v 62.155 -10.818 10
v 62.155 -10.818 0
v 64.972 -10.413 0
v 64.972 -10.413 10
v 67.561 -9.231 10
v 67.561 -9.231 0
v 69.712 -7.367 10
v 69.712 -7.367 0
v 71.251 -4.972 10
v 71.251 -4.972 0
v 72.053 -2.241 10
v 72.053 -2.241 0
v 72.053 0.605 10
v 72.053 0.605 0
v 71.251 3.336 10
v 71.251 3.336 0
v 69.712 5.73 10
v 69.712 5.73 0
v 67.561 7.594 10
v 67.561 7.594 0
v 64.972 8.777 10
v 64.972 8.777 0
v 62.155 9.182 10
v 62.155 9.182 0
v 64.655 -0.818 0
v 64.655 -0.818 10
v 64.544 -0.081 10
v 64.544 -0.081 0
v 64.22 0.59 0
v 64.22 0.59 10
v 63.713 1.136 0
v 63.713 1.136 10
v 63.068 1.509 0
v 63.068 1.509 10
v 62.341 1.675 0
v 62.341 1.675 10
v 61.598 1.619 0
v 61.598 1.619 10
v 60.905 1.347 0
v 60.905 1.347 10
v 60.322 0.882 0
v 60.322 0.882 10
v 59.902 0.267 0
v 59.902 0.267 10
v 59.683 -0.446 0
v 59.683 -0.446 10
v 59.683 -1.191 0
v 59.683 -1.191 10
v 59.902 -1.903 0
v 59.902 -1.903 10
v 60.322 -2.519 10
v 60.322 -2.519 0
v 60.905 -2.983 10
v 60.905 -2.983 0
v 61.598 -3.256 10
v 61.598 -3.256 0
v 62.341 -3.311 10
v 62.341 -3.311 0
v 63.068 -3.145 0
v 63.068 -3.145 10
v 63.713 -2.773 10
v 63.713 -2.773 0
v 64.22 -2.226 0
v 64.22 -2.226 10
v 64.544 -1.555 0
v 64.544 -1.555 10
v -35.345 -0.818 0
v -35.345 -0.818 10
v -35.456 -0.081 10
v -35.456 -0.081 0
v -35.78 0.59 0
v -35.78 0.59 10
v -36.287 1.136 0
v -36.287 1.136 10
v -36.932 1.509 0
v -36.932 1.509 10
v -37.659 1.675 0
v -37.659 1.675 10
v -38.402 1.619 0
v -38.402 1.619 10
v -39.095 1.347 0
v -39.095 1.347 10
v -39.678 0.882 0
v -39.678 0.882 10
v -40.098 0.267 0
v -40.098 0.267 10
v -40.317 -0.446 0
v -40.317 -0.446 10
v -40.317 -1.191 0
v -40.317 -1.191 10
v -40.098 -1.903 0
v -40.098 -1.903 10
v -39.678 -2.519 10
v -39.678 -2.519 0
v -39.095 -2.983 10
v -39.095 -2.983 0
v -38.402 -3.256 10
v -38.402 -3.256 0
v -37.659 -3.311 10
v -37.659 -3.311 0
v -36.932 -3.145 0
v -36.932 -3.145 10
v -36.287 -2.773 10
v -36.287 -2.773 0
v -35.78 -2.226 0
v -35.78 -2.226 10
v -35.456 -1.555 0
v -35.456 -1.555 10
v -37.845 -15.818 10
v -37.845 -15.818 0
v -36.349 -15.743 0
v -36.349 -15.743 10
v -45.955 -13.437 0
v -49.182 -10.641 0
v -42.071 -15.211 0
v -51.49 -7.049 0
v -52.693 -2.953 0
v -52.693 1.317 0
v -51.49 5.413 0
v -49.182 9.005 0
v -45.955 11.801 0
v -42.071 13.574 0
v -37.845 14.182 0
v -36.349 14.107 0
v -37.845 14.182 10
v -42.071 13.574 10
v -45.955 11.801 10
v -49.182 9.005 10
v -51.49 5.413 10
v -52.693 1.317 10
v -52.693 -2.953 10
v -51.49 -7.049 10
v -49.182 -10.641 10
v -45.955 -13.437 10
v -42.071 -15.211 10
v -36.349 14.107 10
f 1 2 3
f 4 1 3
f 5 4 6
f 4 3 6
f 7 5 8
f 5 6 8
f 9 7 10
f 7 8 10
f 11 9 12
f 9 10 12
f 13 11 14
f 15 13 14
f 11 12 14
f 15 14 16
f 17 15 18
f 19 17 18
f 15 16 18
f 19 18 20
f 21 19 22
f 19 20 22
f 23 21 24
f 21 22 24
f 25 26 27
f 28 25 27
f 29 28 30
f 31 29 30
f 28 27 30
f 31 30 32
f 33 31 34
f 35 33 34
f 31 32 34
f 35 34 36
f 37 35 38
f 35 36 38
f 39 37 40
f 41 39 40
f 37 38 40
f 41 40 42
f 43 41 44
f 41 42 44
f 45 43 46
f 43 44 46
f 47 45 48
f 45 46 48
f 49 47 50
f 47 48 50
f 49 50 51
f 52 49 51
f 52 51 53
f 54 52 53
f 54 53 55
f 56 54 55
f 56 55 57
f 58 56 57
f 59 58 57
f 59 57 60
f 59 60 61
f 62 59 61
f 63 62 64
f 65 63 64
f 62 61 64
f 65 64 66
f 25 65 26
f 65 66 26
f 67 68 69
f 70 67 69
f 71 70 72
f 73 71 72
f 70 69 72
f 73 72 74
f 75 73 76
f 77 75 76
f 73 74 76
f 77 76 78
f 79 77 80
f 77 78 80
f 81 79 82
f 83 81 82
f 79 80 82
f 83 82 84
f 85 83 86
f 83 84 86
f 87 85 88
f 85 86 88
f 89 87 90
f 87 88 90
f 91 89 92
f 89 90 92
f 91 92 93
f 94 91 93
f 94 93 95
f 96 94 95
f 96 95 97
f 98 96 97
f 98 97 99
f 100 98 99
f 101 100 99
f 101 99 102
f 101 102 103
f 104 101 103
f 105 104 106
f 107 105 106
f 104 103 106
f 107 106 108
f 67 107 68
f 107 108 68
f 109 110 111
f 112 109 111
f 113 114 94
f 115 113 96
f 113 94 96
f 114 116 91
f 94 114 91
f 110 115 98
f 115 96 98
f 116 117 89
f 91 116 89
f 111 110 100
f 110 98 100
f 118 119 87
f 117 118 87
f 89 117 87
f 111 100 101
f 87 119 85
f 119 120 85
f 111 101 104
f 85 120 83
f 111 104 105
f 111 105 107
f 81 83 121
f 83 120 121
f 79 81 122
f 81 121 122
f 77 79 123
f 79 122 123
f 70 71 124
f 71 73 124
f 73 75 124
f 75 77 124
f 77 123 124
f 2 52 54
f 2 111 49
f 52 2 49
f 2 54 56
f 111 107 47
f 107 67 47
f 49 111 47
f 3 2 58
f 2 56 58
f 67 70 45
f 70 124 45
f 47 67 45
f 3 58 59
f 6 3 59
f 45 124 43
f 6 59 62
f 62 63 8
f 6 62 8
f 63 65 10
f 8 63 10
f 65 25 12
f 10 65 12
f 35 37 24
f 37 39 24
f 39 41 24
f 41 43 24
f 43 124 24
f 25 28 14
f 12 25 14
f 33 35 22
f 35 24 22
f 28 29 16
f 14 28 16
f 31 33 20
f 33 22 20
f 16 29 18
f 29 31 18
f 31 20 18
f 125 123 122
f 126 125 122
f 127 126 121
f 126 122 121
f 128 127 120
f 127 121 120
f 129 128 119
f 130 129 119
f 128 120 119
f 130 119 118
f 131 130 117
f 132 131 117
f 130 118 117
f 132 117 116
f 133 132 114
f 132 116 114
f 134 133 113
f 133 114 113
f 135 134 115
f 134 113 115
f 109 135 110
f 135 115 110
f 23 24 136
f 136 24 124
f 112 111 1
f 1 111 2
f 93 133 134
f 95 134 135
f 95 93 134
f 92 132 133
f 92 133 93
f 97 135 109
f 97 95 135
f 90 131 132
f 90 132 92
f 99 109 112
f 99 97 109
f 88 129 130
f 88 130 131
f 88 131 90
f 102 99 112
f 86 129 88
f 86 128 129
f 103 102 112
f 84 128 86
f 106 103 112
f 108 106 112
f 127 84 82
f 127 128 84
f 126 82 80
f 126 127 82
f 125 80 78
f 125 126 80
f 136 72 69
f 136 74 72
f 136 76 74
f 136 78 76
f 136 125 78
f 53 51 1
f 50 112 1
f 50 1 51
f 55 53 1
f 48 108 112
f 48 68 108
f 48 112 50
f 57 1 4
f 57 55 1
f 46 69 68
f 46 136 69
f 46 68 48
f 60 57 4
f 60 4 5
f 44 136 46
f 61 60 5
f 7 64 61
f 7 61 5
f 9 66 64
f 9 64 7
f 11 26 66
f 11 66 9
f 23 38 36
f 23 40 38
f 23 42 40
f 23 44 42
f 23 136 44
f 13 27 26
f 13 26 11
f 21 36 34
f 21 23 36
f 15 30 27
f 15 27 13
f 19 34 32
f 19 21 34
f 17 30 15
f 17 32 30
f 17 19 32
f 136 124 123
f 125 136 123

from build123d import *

# Parameters (mm, degrees)
SKETCH1_R           = 10
BOSS_EXTRUDE1_DEPTH = 10
SKETCH9_R           = 2.5
CUT_EXTRUDE7_DEPTH  = 10


with BuildPart() as part:
    # Sketch1 → Boss-Extrude1 (new body)
    with BuildSketch(Plane.XY):
        with BuildLine():
            Line((-36.34910837, 14.107005992), (-37.845367722, 14.18181896))
            ThreePointArc((-37.845367722, 14.18181896), (-52.845367722, -0.81818104), (-37.845367722, -15.81818104))
            Line((-37.845367722, -15.81818104), (-36.34910837, -15.743368072))
            ThreePointArc((-36.34910837, -15.743368072), (-26.722331035, -10.8818809), (-22.845367722, -0.81818104))
            ThreePointArc((-22.845367722, -0.81818104), (-26.722331035, 9.245518819), (-36.34910837, 14.107005992))
        make_face()
        with BuildLine():
            Line((62.154632278, 9.18181896), (-36.34910837, 14.107005992))
            ThreePointArc((-36.34910837, 14.107005992), (-26.722331035, 9.245518819), (-22.845367722, -0.81818104))
            ThreePointArc((-22.845367722, -0.81818104), (-26.722331035, -10.8818809), (-36.34910837, -15.743368072))
            Line((-36.34910837, -15.743368072), (62.154632278, -10.81818104))
            ThreePointArc((62.154632278, -10.81818104), (52.154632278, -0.81818104), (62.154632278, 9.18181896))
        make_face()
        with Locations((62.154632278, -0.81818104)):
            Circle(SKETCH1_R)
    extrude(amount=BOSS_EXTRUDE1_DEPTH)

    # Sketch9 → Cut-Extrude7 (cut)
    with BuildSketch(Plane.XY.offset(10)):
        with Locations((-37.845367722, -0.81818104)):
            Circle(SKETCH9_R)
        with Locations((62.154632278, -0.81818104)):
            Circle(SKETCH9_R)
    extrude(amount=-CUT_EXTRUDE7_DEPTH, mode=Mode.SUBTRACT)


solid = part.part
